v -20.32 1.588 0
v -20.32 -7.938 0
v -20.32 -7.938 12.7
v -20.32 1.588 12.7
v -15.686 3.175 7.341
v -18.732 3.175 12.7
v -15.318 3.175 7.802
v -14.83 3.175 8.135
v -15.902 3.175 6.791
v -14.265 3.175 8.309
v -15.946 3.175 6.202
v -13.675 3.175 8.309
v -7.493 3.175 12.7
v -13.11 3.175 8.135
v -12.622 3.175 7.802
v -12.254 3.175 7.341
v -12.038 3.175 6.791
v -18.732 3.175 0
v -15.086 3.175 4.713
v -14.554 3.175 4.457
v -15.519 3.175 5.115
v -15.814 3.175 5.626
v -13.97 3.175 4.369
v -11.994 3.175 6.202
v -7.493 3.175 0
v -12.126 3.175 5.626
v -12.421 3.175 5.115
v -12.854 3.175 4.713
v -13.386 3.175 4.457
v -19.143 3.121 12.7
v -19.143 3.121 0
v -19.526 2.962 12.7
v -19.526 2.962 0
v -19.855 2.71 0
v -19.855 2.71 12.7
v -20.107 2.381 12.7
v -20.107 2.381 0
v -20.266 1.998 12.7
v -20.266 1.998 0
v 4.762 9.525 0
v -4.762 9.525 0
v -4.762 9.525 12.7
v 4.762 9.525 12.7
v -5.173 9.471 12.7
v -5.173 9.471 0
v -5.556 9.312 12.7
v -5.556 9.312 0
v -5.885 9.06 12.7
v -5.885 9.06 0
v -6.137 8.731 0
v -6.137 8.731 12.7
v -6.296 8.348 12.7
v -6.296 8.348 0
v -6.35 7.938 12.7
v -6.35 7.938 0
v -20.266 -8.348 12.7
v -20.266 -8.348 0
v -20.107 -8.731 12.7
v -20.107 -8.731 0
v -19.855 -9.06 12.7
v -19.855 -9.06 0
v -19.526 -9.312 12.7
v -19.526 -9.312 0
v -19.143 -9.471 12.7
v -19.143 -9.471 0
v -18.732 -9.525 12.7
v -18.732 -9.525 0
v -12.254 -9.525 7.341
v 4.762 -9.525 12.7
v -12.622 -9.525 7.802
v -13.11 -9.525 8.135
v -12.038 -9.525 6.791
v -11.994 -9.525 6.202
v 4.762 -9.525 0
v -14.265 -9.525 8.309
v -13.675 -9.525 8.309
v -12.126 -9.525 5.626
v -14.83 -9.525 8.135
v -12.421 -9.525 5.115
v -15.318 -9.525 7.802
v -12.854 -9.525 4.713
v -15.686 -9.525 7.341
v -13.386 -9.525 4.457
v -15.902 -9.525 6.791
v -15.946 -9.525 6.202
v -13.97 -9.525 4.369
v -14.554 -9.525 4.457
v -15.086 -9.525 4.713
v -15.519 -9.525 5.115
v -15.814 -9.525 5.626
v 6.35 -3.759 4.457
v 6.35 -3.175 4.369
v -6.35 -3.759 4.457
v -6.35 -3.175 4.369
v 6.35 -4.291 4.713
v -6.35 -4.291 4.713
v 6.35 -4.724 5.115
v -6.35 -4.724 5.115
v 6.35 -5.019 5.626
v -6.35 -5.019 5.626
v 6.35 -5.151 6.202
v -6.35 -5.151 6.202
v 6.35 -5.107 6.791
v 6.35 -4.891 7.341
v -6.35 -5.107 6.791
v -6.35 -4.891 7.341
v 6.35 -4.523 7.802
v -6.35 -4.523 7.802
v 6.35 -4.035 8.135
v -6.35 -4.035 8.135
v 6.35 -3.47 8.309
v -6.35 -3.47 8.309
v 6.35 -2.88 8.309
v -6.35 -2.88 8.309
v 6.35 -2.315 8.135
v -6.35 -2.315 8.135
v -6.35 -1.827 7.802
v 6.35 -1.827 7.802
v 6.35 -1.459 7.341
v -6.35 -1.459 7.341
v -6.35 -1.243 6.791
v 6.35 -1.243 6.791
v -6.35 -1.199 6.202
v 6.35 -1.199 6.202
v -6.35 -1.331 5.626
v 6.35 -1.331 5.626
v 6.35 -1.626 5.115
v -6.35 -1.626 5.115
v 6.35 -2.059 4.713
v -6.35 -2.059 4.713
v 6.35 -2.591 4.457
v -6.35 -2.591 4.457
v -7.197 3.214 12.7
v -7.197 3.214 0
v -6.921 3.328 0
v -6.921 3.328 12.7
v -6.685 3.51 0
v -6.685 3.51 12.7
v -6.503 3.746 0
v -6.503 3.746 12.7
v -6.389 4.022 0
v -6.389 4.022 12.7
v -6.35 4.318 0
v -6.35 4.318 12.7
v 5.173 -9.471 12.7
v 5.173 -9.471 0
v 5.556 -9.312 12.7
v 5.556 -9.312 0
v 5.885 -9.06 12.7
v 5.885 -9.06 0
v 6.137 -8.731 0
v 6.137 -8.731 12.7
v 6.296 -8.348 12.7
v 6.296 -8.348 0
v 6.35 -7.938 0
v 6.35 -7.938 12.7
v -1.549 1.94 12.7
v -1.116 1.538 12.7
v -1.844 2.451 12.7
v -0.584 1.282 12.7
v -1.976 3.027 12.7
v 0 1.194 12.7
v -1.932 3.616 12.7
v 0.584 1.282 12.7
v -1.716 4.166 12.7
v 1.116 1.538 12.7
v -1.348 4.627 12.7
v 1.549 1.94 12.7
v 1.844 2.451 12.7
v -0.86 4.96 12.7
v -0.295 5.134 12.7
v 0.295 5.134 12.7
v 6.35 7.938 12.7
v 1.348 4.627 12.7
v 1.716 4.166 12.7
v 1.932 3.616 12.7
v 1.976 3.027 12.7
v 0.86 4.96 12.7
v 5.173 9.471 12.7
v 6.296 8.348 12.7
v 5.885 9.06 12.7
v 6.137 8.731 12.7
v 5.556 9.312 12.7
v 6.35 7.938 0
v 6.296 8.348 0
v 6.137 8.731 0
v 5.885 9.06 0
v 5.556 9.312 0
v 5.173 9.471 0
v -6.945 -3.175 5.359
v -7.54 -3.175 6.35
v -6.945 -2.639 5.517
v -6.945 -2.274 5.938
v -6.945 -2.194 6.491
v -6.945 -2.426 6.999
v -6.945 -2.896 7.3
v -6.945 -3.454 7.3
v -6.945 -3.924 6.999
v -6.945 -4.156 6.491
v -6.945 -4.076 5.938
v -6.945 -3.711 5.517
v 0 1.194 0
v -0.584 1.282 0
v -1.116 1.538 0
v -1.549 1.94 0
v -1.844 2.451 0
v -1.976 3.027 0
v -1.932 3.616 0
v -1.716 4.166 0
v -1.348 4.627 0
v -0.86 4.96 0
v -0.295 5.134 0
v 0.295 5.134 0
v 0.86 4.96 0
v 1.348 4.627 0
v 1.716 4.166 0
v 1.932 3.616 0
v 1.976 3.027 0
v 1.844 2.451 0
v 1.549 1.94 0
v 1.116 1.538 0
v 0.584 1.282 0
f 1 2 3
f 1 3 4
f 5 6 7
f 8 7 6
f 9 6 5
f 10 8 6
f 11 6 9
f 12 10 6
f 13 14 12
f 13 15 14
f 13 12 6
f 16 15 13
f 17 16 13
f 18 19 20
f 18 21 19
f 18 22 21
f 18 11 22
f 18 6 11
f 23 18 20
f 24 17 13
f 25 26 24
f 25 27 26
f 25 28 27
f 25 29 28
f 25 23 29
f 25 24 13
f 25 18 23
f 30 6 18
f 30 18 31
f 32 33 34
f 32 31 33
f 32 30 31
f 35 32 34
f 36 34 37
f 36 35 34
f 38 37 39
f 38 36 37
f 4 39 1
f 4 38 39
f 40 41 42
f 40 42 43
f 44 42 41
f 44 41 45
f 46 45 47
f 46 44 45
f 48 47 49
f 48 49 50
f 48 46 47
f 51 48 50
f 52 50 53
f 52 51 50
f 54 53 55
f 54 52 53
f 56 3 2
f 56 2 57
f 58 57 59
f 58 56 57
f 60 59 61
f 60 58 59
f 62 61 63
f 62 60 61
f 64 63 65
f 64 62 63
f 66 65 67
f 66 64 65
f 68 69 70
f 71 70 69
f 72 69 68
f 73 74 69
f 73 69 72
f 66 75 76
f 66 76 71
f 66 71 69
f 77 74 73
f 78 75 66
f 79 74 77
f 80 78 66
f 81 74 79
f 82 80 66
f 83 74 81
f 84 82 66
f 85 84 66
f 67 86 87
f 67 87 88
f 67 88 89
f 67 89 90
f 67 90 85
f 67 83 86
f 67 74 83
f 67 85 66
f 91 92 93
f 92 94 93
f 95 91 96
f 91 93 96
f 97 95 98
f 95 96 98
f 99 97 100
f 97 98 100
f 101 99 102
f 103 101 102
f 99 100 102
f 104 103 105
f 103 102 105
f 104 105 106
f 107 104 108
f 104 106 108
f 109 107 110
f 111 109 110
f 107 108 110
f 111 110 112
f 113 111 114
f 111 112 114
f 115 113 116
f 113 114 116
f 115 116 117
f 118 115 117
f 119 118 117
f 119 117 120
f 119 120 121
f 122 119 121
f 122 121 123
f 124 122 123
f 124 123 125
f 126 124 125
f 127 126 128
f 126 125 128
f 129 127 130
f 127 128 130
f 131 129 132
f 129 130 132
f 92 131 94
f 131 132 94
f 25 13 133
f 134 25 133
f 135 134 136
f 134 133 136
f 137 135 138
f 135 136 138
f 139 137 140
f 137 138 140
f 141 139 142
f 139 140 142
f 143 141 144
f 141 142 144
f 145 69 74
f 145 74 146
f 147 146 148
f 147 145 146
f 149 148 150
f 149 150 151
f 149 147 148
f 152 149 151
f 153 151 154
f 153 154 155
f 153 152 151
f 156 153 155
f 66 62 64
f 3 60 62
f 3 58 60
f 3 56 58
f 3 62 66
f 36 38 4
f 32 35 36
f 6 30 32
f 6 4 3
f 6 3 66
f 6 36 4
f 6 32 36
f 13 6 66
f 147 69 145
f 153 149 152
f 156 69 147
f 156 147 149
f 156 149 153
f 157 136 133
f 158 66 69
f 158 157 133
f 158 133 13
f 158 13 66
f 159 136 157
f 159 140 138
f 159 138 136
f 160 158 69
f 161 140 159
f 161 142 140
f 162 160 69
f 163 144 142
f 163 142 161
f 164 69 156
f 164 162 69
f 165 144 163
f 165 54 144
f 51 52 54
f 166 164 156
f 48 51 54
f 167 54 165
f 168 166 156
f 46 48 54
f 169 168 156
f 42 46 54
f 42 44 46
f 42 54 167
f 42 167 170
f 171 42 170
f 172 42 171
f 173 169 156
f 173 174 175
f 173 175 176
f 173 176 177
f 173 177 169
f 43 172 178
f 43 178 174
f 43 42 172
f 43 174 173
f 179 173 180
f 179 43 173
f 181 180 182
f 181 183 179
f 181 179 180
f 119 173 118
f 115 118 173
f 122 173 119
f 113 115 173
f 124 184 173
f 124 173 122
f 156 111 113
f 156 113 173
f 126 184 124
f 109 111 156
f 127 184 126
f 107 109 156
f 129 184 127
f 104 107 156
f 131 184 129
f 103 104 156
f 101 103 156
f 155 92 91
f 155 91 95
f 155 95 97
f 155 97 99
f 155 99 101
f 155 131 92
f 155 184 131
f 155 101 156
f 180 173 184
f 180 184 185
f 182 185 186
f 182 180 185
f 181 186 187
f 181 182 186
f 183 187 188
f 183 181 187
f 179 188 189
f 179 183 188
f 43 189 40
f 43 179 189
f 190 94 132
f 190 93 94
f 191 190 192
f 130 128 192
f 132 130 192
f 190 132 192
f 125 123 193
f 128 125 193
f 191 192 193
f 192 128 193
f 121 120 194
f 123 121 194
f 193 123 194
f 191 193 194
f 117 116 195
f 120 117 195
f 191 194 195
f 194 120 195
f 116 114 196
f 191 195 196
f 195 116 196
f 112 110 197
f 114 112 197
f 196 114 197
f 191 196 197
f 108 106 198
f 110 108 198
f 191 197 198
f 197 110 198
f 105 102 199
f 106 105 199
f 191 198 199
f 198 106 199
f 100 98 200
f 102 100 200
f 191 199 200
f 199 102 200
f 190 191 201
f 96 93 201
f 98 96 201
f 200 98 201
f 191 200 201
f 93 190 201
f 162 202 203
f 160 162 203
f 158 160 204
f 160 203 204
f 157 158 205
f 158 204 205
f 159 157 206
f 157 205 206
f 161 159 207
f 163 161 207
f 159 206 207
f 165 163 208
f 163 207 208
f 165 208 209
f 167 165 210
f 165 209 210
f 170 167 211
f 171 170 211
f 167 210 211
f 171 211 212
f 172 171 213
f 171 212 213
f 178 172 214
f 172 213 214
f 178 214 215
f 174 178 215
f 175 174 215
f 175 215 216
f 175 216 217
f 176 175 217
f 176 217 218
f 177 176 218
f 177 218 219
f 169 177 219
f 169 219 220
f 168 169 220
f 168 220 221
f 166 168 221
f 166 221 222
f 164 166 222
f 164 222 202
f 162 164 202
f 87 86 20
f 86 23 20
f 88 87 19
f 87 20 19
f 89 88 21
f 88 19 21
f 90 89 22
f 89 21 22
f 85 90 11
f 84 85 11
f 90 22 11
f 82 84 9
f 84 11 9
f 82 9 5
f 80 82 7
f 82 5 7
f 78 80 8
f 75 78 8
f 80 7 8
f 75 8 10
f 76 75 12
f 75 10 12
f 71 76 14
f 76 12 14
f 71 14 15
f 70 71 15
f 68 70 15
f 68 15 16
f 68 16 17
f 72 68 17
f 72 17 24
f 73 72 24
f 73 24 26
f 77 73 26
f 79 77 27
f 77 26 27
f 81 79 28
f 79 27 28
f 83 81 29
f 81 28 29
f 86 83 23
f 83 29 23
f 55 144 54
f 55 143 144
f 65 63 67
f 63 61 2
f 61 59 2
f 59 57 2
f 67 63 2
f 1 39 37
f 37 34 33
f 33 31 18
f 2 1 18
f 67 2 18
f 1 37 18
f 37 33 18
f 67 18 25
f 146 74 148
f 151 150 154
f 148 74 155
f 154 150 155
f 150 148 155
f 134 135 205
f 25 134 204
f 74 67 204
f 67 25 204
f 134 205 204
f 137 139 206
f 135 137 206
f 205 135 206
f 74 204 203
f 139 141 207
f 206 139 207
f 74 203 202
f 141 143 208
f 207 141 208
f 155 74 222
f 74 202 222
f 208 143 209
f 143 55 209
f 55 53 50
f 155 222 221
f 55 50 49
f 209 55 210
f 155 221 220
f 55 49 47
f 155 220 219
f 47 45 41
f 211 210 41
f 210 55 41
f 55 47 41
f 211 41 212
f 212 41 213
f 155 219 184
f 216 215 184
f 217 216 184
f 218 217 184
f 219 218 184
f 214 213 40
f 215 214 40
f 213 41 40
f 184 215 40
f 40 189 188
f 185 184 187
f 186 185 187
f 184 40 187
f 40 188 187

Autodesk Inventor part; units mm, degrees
ref_plane "YZ Plane" through (0, 0, 0) normal (1, 0, 0) x (0, 1, 0)
ref_plane "XZ Plane" through (0, 0, 0) normal (0, 1, 0) x (-1, 0, 0)
ref_plane "XY Plane" through (0, 0, 0) normal (0, 0, 1) x (1, 0, 0)
sketch "Sketch1" plane through (0, 0, 0) normal (0, 0, 1) x (1, 0, 0)
  line L0 (6.35, -9.525) -> (-6.35, -9.525)
  line L1 (-6.35, 3.175) -> (-6.35, 9.525)
  line L2 (-6.35, 9.525) -> (6.35, 9.525)
  line L3 (6.35, 9.525) -> (6.35, -9.525)
  line L4 (6.35, -9.525) -> (-6.35, 9.525) construction
  line L5 (-6.35, -9.525) -> (6.35, 9.525) construction
  line L6 (-6.35, -9.525) -> (-20.32, -9.525)
  line L7 (-20.32, -9.525) -> (-20.32, 3.175)
  line L8 (-20.32, 3.175) -> (-6.35, 3.175)
  line L9 (-6.35, 3.175) -> (-6.35, -9.525) construction
  point P0 (0, 0)
  dimension "d0" = 12.7
  dimension "d1" = 19.05
  dimension "d3" = 12.7
  dimension "d4" = 13.97
extrude "Plate1" add sketch "Sketch1" along normal blind 12.7
sketch "Sketch2" plane through (0, 0, 12.7) normal (0, 0, 1) x (1, 0, 0)
  line L0 (-6.35, 9.525) -> (6.35, 9.525) projected
  point P0 (0, 0)
  point P1 (0, 3.175)
  dimension "d5" = 6.35
hole "Hole1" at (0, 3.175, 12.7) direction (0, 0, -1) diameter 3.9624 depth 13.6144 tip angle 118 thread size "10-32 UNF" class "2B" standard "ANSI Unified Screw Threads"
sketch "Sketch3" plane through (-20.32, -9.525, 0) normal (0, -1, 0) x (1, 0, 0)
  line L0 (0, 0) -> (0, 12.7) projected
  line L1 (0, 0) -> (26.67, 0) projected
  point P0 (20.32, 0)
  point P1 (6.35, 6.35)
  dimension "d13" = 6.35
  dimension "d14" = 6.35
hole "Hole2" at (-13.97, -9.525, 6.35) direction (0, 1, 0) diameter 3.9624 depth 23.1394 tip angle 118 thread size "10-32 UNF" class "2B" standard "ANSI Unified Screw Threads"
sketch "Sketch4" plane through (6.35, -9.525, 0) normal (1, 0, 0) x (0, 0, -1)
  line L0 (0, 0) -> (-12.7, 0) projected
  line L1 (-12.7, 19.05) -> (-12.7, 0) projected
  point P0 (0, 9.525)
  point P1 (-6.35, 6.35)
  dimension "d22" = 6.35
  dimension "d23" = 6.35
hole "Hole3" at (6.35, -3.175, 6.35) direction (-1, 0, 0) diameter 3.9624 depth 12.7 tip angle 118 thread size "10-32 UNF" class "2B" standard "ANSI Unified Screw Threads"
fillet "Corner Round1" radius 1.5875 5 edges at (6.35, 9.525, 6.35) (-6.35, 9.525, 6.35) (-20.32, 3.175, 6.35) (-20.32, -9.525, 6.35) (6.35, -9.525, 6.35)
fillet "Corner Round1" radius 1.143 1 edges at (-6.35, 3.175, 6.35)
equation "\"d14\" = d13"
equation "\"d29\" = Thickness"
equation "\"d2\" = Thickness"
equation "\"BendRadius\" = Thickness"
equation "\"BendReliefWidth\" = Thickness"
equation "\"BendReliefDepth\" = 0.5 * Thickness"
equation "\"CornerReliefSize\" = 4 * Thickness"
equation "\"MinimumRemnant\" = 2 * Thickness"
equation "\"TransitionRadius\" = BendRadius"
equation "\"JacobiRadiusSize\" = BendRadius"
equation "\"GapSize\" = Thickness"
equation "\"Thickness\" = 12.7"
properties part number "PLATE,NUT-BLOCK,L-SHAPE" material "Aluminum 6061"
